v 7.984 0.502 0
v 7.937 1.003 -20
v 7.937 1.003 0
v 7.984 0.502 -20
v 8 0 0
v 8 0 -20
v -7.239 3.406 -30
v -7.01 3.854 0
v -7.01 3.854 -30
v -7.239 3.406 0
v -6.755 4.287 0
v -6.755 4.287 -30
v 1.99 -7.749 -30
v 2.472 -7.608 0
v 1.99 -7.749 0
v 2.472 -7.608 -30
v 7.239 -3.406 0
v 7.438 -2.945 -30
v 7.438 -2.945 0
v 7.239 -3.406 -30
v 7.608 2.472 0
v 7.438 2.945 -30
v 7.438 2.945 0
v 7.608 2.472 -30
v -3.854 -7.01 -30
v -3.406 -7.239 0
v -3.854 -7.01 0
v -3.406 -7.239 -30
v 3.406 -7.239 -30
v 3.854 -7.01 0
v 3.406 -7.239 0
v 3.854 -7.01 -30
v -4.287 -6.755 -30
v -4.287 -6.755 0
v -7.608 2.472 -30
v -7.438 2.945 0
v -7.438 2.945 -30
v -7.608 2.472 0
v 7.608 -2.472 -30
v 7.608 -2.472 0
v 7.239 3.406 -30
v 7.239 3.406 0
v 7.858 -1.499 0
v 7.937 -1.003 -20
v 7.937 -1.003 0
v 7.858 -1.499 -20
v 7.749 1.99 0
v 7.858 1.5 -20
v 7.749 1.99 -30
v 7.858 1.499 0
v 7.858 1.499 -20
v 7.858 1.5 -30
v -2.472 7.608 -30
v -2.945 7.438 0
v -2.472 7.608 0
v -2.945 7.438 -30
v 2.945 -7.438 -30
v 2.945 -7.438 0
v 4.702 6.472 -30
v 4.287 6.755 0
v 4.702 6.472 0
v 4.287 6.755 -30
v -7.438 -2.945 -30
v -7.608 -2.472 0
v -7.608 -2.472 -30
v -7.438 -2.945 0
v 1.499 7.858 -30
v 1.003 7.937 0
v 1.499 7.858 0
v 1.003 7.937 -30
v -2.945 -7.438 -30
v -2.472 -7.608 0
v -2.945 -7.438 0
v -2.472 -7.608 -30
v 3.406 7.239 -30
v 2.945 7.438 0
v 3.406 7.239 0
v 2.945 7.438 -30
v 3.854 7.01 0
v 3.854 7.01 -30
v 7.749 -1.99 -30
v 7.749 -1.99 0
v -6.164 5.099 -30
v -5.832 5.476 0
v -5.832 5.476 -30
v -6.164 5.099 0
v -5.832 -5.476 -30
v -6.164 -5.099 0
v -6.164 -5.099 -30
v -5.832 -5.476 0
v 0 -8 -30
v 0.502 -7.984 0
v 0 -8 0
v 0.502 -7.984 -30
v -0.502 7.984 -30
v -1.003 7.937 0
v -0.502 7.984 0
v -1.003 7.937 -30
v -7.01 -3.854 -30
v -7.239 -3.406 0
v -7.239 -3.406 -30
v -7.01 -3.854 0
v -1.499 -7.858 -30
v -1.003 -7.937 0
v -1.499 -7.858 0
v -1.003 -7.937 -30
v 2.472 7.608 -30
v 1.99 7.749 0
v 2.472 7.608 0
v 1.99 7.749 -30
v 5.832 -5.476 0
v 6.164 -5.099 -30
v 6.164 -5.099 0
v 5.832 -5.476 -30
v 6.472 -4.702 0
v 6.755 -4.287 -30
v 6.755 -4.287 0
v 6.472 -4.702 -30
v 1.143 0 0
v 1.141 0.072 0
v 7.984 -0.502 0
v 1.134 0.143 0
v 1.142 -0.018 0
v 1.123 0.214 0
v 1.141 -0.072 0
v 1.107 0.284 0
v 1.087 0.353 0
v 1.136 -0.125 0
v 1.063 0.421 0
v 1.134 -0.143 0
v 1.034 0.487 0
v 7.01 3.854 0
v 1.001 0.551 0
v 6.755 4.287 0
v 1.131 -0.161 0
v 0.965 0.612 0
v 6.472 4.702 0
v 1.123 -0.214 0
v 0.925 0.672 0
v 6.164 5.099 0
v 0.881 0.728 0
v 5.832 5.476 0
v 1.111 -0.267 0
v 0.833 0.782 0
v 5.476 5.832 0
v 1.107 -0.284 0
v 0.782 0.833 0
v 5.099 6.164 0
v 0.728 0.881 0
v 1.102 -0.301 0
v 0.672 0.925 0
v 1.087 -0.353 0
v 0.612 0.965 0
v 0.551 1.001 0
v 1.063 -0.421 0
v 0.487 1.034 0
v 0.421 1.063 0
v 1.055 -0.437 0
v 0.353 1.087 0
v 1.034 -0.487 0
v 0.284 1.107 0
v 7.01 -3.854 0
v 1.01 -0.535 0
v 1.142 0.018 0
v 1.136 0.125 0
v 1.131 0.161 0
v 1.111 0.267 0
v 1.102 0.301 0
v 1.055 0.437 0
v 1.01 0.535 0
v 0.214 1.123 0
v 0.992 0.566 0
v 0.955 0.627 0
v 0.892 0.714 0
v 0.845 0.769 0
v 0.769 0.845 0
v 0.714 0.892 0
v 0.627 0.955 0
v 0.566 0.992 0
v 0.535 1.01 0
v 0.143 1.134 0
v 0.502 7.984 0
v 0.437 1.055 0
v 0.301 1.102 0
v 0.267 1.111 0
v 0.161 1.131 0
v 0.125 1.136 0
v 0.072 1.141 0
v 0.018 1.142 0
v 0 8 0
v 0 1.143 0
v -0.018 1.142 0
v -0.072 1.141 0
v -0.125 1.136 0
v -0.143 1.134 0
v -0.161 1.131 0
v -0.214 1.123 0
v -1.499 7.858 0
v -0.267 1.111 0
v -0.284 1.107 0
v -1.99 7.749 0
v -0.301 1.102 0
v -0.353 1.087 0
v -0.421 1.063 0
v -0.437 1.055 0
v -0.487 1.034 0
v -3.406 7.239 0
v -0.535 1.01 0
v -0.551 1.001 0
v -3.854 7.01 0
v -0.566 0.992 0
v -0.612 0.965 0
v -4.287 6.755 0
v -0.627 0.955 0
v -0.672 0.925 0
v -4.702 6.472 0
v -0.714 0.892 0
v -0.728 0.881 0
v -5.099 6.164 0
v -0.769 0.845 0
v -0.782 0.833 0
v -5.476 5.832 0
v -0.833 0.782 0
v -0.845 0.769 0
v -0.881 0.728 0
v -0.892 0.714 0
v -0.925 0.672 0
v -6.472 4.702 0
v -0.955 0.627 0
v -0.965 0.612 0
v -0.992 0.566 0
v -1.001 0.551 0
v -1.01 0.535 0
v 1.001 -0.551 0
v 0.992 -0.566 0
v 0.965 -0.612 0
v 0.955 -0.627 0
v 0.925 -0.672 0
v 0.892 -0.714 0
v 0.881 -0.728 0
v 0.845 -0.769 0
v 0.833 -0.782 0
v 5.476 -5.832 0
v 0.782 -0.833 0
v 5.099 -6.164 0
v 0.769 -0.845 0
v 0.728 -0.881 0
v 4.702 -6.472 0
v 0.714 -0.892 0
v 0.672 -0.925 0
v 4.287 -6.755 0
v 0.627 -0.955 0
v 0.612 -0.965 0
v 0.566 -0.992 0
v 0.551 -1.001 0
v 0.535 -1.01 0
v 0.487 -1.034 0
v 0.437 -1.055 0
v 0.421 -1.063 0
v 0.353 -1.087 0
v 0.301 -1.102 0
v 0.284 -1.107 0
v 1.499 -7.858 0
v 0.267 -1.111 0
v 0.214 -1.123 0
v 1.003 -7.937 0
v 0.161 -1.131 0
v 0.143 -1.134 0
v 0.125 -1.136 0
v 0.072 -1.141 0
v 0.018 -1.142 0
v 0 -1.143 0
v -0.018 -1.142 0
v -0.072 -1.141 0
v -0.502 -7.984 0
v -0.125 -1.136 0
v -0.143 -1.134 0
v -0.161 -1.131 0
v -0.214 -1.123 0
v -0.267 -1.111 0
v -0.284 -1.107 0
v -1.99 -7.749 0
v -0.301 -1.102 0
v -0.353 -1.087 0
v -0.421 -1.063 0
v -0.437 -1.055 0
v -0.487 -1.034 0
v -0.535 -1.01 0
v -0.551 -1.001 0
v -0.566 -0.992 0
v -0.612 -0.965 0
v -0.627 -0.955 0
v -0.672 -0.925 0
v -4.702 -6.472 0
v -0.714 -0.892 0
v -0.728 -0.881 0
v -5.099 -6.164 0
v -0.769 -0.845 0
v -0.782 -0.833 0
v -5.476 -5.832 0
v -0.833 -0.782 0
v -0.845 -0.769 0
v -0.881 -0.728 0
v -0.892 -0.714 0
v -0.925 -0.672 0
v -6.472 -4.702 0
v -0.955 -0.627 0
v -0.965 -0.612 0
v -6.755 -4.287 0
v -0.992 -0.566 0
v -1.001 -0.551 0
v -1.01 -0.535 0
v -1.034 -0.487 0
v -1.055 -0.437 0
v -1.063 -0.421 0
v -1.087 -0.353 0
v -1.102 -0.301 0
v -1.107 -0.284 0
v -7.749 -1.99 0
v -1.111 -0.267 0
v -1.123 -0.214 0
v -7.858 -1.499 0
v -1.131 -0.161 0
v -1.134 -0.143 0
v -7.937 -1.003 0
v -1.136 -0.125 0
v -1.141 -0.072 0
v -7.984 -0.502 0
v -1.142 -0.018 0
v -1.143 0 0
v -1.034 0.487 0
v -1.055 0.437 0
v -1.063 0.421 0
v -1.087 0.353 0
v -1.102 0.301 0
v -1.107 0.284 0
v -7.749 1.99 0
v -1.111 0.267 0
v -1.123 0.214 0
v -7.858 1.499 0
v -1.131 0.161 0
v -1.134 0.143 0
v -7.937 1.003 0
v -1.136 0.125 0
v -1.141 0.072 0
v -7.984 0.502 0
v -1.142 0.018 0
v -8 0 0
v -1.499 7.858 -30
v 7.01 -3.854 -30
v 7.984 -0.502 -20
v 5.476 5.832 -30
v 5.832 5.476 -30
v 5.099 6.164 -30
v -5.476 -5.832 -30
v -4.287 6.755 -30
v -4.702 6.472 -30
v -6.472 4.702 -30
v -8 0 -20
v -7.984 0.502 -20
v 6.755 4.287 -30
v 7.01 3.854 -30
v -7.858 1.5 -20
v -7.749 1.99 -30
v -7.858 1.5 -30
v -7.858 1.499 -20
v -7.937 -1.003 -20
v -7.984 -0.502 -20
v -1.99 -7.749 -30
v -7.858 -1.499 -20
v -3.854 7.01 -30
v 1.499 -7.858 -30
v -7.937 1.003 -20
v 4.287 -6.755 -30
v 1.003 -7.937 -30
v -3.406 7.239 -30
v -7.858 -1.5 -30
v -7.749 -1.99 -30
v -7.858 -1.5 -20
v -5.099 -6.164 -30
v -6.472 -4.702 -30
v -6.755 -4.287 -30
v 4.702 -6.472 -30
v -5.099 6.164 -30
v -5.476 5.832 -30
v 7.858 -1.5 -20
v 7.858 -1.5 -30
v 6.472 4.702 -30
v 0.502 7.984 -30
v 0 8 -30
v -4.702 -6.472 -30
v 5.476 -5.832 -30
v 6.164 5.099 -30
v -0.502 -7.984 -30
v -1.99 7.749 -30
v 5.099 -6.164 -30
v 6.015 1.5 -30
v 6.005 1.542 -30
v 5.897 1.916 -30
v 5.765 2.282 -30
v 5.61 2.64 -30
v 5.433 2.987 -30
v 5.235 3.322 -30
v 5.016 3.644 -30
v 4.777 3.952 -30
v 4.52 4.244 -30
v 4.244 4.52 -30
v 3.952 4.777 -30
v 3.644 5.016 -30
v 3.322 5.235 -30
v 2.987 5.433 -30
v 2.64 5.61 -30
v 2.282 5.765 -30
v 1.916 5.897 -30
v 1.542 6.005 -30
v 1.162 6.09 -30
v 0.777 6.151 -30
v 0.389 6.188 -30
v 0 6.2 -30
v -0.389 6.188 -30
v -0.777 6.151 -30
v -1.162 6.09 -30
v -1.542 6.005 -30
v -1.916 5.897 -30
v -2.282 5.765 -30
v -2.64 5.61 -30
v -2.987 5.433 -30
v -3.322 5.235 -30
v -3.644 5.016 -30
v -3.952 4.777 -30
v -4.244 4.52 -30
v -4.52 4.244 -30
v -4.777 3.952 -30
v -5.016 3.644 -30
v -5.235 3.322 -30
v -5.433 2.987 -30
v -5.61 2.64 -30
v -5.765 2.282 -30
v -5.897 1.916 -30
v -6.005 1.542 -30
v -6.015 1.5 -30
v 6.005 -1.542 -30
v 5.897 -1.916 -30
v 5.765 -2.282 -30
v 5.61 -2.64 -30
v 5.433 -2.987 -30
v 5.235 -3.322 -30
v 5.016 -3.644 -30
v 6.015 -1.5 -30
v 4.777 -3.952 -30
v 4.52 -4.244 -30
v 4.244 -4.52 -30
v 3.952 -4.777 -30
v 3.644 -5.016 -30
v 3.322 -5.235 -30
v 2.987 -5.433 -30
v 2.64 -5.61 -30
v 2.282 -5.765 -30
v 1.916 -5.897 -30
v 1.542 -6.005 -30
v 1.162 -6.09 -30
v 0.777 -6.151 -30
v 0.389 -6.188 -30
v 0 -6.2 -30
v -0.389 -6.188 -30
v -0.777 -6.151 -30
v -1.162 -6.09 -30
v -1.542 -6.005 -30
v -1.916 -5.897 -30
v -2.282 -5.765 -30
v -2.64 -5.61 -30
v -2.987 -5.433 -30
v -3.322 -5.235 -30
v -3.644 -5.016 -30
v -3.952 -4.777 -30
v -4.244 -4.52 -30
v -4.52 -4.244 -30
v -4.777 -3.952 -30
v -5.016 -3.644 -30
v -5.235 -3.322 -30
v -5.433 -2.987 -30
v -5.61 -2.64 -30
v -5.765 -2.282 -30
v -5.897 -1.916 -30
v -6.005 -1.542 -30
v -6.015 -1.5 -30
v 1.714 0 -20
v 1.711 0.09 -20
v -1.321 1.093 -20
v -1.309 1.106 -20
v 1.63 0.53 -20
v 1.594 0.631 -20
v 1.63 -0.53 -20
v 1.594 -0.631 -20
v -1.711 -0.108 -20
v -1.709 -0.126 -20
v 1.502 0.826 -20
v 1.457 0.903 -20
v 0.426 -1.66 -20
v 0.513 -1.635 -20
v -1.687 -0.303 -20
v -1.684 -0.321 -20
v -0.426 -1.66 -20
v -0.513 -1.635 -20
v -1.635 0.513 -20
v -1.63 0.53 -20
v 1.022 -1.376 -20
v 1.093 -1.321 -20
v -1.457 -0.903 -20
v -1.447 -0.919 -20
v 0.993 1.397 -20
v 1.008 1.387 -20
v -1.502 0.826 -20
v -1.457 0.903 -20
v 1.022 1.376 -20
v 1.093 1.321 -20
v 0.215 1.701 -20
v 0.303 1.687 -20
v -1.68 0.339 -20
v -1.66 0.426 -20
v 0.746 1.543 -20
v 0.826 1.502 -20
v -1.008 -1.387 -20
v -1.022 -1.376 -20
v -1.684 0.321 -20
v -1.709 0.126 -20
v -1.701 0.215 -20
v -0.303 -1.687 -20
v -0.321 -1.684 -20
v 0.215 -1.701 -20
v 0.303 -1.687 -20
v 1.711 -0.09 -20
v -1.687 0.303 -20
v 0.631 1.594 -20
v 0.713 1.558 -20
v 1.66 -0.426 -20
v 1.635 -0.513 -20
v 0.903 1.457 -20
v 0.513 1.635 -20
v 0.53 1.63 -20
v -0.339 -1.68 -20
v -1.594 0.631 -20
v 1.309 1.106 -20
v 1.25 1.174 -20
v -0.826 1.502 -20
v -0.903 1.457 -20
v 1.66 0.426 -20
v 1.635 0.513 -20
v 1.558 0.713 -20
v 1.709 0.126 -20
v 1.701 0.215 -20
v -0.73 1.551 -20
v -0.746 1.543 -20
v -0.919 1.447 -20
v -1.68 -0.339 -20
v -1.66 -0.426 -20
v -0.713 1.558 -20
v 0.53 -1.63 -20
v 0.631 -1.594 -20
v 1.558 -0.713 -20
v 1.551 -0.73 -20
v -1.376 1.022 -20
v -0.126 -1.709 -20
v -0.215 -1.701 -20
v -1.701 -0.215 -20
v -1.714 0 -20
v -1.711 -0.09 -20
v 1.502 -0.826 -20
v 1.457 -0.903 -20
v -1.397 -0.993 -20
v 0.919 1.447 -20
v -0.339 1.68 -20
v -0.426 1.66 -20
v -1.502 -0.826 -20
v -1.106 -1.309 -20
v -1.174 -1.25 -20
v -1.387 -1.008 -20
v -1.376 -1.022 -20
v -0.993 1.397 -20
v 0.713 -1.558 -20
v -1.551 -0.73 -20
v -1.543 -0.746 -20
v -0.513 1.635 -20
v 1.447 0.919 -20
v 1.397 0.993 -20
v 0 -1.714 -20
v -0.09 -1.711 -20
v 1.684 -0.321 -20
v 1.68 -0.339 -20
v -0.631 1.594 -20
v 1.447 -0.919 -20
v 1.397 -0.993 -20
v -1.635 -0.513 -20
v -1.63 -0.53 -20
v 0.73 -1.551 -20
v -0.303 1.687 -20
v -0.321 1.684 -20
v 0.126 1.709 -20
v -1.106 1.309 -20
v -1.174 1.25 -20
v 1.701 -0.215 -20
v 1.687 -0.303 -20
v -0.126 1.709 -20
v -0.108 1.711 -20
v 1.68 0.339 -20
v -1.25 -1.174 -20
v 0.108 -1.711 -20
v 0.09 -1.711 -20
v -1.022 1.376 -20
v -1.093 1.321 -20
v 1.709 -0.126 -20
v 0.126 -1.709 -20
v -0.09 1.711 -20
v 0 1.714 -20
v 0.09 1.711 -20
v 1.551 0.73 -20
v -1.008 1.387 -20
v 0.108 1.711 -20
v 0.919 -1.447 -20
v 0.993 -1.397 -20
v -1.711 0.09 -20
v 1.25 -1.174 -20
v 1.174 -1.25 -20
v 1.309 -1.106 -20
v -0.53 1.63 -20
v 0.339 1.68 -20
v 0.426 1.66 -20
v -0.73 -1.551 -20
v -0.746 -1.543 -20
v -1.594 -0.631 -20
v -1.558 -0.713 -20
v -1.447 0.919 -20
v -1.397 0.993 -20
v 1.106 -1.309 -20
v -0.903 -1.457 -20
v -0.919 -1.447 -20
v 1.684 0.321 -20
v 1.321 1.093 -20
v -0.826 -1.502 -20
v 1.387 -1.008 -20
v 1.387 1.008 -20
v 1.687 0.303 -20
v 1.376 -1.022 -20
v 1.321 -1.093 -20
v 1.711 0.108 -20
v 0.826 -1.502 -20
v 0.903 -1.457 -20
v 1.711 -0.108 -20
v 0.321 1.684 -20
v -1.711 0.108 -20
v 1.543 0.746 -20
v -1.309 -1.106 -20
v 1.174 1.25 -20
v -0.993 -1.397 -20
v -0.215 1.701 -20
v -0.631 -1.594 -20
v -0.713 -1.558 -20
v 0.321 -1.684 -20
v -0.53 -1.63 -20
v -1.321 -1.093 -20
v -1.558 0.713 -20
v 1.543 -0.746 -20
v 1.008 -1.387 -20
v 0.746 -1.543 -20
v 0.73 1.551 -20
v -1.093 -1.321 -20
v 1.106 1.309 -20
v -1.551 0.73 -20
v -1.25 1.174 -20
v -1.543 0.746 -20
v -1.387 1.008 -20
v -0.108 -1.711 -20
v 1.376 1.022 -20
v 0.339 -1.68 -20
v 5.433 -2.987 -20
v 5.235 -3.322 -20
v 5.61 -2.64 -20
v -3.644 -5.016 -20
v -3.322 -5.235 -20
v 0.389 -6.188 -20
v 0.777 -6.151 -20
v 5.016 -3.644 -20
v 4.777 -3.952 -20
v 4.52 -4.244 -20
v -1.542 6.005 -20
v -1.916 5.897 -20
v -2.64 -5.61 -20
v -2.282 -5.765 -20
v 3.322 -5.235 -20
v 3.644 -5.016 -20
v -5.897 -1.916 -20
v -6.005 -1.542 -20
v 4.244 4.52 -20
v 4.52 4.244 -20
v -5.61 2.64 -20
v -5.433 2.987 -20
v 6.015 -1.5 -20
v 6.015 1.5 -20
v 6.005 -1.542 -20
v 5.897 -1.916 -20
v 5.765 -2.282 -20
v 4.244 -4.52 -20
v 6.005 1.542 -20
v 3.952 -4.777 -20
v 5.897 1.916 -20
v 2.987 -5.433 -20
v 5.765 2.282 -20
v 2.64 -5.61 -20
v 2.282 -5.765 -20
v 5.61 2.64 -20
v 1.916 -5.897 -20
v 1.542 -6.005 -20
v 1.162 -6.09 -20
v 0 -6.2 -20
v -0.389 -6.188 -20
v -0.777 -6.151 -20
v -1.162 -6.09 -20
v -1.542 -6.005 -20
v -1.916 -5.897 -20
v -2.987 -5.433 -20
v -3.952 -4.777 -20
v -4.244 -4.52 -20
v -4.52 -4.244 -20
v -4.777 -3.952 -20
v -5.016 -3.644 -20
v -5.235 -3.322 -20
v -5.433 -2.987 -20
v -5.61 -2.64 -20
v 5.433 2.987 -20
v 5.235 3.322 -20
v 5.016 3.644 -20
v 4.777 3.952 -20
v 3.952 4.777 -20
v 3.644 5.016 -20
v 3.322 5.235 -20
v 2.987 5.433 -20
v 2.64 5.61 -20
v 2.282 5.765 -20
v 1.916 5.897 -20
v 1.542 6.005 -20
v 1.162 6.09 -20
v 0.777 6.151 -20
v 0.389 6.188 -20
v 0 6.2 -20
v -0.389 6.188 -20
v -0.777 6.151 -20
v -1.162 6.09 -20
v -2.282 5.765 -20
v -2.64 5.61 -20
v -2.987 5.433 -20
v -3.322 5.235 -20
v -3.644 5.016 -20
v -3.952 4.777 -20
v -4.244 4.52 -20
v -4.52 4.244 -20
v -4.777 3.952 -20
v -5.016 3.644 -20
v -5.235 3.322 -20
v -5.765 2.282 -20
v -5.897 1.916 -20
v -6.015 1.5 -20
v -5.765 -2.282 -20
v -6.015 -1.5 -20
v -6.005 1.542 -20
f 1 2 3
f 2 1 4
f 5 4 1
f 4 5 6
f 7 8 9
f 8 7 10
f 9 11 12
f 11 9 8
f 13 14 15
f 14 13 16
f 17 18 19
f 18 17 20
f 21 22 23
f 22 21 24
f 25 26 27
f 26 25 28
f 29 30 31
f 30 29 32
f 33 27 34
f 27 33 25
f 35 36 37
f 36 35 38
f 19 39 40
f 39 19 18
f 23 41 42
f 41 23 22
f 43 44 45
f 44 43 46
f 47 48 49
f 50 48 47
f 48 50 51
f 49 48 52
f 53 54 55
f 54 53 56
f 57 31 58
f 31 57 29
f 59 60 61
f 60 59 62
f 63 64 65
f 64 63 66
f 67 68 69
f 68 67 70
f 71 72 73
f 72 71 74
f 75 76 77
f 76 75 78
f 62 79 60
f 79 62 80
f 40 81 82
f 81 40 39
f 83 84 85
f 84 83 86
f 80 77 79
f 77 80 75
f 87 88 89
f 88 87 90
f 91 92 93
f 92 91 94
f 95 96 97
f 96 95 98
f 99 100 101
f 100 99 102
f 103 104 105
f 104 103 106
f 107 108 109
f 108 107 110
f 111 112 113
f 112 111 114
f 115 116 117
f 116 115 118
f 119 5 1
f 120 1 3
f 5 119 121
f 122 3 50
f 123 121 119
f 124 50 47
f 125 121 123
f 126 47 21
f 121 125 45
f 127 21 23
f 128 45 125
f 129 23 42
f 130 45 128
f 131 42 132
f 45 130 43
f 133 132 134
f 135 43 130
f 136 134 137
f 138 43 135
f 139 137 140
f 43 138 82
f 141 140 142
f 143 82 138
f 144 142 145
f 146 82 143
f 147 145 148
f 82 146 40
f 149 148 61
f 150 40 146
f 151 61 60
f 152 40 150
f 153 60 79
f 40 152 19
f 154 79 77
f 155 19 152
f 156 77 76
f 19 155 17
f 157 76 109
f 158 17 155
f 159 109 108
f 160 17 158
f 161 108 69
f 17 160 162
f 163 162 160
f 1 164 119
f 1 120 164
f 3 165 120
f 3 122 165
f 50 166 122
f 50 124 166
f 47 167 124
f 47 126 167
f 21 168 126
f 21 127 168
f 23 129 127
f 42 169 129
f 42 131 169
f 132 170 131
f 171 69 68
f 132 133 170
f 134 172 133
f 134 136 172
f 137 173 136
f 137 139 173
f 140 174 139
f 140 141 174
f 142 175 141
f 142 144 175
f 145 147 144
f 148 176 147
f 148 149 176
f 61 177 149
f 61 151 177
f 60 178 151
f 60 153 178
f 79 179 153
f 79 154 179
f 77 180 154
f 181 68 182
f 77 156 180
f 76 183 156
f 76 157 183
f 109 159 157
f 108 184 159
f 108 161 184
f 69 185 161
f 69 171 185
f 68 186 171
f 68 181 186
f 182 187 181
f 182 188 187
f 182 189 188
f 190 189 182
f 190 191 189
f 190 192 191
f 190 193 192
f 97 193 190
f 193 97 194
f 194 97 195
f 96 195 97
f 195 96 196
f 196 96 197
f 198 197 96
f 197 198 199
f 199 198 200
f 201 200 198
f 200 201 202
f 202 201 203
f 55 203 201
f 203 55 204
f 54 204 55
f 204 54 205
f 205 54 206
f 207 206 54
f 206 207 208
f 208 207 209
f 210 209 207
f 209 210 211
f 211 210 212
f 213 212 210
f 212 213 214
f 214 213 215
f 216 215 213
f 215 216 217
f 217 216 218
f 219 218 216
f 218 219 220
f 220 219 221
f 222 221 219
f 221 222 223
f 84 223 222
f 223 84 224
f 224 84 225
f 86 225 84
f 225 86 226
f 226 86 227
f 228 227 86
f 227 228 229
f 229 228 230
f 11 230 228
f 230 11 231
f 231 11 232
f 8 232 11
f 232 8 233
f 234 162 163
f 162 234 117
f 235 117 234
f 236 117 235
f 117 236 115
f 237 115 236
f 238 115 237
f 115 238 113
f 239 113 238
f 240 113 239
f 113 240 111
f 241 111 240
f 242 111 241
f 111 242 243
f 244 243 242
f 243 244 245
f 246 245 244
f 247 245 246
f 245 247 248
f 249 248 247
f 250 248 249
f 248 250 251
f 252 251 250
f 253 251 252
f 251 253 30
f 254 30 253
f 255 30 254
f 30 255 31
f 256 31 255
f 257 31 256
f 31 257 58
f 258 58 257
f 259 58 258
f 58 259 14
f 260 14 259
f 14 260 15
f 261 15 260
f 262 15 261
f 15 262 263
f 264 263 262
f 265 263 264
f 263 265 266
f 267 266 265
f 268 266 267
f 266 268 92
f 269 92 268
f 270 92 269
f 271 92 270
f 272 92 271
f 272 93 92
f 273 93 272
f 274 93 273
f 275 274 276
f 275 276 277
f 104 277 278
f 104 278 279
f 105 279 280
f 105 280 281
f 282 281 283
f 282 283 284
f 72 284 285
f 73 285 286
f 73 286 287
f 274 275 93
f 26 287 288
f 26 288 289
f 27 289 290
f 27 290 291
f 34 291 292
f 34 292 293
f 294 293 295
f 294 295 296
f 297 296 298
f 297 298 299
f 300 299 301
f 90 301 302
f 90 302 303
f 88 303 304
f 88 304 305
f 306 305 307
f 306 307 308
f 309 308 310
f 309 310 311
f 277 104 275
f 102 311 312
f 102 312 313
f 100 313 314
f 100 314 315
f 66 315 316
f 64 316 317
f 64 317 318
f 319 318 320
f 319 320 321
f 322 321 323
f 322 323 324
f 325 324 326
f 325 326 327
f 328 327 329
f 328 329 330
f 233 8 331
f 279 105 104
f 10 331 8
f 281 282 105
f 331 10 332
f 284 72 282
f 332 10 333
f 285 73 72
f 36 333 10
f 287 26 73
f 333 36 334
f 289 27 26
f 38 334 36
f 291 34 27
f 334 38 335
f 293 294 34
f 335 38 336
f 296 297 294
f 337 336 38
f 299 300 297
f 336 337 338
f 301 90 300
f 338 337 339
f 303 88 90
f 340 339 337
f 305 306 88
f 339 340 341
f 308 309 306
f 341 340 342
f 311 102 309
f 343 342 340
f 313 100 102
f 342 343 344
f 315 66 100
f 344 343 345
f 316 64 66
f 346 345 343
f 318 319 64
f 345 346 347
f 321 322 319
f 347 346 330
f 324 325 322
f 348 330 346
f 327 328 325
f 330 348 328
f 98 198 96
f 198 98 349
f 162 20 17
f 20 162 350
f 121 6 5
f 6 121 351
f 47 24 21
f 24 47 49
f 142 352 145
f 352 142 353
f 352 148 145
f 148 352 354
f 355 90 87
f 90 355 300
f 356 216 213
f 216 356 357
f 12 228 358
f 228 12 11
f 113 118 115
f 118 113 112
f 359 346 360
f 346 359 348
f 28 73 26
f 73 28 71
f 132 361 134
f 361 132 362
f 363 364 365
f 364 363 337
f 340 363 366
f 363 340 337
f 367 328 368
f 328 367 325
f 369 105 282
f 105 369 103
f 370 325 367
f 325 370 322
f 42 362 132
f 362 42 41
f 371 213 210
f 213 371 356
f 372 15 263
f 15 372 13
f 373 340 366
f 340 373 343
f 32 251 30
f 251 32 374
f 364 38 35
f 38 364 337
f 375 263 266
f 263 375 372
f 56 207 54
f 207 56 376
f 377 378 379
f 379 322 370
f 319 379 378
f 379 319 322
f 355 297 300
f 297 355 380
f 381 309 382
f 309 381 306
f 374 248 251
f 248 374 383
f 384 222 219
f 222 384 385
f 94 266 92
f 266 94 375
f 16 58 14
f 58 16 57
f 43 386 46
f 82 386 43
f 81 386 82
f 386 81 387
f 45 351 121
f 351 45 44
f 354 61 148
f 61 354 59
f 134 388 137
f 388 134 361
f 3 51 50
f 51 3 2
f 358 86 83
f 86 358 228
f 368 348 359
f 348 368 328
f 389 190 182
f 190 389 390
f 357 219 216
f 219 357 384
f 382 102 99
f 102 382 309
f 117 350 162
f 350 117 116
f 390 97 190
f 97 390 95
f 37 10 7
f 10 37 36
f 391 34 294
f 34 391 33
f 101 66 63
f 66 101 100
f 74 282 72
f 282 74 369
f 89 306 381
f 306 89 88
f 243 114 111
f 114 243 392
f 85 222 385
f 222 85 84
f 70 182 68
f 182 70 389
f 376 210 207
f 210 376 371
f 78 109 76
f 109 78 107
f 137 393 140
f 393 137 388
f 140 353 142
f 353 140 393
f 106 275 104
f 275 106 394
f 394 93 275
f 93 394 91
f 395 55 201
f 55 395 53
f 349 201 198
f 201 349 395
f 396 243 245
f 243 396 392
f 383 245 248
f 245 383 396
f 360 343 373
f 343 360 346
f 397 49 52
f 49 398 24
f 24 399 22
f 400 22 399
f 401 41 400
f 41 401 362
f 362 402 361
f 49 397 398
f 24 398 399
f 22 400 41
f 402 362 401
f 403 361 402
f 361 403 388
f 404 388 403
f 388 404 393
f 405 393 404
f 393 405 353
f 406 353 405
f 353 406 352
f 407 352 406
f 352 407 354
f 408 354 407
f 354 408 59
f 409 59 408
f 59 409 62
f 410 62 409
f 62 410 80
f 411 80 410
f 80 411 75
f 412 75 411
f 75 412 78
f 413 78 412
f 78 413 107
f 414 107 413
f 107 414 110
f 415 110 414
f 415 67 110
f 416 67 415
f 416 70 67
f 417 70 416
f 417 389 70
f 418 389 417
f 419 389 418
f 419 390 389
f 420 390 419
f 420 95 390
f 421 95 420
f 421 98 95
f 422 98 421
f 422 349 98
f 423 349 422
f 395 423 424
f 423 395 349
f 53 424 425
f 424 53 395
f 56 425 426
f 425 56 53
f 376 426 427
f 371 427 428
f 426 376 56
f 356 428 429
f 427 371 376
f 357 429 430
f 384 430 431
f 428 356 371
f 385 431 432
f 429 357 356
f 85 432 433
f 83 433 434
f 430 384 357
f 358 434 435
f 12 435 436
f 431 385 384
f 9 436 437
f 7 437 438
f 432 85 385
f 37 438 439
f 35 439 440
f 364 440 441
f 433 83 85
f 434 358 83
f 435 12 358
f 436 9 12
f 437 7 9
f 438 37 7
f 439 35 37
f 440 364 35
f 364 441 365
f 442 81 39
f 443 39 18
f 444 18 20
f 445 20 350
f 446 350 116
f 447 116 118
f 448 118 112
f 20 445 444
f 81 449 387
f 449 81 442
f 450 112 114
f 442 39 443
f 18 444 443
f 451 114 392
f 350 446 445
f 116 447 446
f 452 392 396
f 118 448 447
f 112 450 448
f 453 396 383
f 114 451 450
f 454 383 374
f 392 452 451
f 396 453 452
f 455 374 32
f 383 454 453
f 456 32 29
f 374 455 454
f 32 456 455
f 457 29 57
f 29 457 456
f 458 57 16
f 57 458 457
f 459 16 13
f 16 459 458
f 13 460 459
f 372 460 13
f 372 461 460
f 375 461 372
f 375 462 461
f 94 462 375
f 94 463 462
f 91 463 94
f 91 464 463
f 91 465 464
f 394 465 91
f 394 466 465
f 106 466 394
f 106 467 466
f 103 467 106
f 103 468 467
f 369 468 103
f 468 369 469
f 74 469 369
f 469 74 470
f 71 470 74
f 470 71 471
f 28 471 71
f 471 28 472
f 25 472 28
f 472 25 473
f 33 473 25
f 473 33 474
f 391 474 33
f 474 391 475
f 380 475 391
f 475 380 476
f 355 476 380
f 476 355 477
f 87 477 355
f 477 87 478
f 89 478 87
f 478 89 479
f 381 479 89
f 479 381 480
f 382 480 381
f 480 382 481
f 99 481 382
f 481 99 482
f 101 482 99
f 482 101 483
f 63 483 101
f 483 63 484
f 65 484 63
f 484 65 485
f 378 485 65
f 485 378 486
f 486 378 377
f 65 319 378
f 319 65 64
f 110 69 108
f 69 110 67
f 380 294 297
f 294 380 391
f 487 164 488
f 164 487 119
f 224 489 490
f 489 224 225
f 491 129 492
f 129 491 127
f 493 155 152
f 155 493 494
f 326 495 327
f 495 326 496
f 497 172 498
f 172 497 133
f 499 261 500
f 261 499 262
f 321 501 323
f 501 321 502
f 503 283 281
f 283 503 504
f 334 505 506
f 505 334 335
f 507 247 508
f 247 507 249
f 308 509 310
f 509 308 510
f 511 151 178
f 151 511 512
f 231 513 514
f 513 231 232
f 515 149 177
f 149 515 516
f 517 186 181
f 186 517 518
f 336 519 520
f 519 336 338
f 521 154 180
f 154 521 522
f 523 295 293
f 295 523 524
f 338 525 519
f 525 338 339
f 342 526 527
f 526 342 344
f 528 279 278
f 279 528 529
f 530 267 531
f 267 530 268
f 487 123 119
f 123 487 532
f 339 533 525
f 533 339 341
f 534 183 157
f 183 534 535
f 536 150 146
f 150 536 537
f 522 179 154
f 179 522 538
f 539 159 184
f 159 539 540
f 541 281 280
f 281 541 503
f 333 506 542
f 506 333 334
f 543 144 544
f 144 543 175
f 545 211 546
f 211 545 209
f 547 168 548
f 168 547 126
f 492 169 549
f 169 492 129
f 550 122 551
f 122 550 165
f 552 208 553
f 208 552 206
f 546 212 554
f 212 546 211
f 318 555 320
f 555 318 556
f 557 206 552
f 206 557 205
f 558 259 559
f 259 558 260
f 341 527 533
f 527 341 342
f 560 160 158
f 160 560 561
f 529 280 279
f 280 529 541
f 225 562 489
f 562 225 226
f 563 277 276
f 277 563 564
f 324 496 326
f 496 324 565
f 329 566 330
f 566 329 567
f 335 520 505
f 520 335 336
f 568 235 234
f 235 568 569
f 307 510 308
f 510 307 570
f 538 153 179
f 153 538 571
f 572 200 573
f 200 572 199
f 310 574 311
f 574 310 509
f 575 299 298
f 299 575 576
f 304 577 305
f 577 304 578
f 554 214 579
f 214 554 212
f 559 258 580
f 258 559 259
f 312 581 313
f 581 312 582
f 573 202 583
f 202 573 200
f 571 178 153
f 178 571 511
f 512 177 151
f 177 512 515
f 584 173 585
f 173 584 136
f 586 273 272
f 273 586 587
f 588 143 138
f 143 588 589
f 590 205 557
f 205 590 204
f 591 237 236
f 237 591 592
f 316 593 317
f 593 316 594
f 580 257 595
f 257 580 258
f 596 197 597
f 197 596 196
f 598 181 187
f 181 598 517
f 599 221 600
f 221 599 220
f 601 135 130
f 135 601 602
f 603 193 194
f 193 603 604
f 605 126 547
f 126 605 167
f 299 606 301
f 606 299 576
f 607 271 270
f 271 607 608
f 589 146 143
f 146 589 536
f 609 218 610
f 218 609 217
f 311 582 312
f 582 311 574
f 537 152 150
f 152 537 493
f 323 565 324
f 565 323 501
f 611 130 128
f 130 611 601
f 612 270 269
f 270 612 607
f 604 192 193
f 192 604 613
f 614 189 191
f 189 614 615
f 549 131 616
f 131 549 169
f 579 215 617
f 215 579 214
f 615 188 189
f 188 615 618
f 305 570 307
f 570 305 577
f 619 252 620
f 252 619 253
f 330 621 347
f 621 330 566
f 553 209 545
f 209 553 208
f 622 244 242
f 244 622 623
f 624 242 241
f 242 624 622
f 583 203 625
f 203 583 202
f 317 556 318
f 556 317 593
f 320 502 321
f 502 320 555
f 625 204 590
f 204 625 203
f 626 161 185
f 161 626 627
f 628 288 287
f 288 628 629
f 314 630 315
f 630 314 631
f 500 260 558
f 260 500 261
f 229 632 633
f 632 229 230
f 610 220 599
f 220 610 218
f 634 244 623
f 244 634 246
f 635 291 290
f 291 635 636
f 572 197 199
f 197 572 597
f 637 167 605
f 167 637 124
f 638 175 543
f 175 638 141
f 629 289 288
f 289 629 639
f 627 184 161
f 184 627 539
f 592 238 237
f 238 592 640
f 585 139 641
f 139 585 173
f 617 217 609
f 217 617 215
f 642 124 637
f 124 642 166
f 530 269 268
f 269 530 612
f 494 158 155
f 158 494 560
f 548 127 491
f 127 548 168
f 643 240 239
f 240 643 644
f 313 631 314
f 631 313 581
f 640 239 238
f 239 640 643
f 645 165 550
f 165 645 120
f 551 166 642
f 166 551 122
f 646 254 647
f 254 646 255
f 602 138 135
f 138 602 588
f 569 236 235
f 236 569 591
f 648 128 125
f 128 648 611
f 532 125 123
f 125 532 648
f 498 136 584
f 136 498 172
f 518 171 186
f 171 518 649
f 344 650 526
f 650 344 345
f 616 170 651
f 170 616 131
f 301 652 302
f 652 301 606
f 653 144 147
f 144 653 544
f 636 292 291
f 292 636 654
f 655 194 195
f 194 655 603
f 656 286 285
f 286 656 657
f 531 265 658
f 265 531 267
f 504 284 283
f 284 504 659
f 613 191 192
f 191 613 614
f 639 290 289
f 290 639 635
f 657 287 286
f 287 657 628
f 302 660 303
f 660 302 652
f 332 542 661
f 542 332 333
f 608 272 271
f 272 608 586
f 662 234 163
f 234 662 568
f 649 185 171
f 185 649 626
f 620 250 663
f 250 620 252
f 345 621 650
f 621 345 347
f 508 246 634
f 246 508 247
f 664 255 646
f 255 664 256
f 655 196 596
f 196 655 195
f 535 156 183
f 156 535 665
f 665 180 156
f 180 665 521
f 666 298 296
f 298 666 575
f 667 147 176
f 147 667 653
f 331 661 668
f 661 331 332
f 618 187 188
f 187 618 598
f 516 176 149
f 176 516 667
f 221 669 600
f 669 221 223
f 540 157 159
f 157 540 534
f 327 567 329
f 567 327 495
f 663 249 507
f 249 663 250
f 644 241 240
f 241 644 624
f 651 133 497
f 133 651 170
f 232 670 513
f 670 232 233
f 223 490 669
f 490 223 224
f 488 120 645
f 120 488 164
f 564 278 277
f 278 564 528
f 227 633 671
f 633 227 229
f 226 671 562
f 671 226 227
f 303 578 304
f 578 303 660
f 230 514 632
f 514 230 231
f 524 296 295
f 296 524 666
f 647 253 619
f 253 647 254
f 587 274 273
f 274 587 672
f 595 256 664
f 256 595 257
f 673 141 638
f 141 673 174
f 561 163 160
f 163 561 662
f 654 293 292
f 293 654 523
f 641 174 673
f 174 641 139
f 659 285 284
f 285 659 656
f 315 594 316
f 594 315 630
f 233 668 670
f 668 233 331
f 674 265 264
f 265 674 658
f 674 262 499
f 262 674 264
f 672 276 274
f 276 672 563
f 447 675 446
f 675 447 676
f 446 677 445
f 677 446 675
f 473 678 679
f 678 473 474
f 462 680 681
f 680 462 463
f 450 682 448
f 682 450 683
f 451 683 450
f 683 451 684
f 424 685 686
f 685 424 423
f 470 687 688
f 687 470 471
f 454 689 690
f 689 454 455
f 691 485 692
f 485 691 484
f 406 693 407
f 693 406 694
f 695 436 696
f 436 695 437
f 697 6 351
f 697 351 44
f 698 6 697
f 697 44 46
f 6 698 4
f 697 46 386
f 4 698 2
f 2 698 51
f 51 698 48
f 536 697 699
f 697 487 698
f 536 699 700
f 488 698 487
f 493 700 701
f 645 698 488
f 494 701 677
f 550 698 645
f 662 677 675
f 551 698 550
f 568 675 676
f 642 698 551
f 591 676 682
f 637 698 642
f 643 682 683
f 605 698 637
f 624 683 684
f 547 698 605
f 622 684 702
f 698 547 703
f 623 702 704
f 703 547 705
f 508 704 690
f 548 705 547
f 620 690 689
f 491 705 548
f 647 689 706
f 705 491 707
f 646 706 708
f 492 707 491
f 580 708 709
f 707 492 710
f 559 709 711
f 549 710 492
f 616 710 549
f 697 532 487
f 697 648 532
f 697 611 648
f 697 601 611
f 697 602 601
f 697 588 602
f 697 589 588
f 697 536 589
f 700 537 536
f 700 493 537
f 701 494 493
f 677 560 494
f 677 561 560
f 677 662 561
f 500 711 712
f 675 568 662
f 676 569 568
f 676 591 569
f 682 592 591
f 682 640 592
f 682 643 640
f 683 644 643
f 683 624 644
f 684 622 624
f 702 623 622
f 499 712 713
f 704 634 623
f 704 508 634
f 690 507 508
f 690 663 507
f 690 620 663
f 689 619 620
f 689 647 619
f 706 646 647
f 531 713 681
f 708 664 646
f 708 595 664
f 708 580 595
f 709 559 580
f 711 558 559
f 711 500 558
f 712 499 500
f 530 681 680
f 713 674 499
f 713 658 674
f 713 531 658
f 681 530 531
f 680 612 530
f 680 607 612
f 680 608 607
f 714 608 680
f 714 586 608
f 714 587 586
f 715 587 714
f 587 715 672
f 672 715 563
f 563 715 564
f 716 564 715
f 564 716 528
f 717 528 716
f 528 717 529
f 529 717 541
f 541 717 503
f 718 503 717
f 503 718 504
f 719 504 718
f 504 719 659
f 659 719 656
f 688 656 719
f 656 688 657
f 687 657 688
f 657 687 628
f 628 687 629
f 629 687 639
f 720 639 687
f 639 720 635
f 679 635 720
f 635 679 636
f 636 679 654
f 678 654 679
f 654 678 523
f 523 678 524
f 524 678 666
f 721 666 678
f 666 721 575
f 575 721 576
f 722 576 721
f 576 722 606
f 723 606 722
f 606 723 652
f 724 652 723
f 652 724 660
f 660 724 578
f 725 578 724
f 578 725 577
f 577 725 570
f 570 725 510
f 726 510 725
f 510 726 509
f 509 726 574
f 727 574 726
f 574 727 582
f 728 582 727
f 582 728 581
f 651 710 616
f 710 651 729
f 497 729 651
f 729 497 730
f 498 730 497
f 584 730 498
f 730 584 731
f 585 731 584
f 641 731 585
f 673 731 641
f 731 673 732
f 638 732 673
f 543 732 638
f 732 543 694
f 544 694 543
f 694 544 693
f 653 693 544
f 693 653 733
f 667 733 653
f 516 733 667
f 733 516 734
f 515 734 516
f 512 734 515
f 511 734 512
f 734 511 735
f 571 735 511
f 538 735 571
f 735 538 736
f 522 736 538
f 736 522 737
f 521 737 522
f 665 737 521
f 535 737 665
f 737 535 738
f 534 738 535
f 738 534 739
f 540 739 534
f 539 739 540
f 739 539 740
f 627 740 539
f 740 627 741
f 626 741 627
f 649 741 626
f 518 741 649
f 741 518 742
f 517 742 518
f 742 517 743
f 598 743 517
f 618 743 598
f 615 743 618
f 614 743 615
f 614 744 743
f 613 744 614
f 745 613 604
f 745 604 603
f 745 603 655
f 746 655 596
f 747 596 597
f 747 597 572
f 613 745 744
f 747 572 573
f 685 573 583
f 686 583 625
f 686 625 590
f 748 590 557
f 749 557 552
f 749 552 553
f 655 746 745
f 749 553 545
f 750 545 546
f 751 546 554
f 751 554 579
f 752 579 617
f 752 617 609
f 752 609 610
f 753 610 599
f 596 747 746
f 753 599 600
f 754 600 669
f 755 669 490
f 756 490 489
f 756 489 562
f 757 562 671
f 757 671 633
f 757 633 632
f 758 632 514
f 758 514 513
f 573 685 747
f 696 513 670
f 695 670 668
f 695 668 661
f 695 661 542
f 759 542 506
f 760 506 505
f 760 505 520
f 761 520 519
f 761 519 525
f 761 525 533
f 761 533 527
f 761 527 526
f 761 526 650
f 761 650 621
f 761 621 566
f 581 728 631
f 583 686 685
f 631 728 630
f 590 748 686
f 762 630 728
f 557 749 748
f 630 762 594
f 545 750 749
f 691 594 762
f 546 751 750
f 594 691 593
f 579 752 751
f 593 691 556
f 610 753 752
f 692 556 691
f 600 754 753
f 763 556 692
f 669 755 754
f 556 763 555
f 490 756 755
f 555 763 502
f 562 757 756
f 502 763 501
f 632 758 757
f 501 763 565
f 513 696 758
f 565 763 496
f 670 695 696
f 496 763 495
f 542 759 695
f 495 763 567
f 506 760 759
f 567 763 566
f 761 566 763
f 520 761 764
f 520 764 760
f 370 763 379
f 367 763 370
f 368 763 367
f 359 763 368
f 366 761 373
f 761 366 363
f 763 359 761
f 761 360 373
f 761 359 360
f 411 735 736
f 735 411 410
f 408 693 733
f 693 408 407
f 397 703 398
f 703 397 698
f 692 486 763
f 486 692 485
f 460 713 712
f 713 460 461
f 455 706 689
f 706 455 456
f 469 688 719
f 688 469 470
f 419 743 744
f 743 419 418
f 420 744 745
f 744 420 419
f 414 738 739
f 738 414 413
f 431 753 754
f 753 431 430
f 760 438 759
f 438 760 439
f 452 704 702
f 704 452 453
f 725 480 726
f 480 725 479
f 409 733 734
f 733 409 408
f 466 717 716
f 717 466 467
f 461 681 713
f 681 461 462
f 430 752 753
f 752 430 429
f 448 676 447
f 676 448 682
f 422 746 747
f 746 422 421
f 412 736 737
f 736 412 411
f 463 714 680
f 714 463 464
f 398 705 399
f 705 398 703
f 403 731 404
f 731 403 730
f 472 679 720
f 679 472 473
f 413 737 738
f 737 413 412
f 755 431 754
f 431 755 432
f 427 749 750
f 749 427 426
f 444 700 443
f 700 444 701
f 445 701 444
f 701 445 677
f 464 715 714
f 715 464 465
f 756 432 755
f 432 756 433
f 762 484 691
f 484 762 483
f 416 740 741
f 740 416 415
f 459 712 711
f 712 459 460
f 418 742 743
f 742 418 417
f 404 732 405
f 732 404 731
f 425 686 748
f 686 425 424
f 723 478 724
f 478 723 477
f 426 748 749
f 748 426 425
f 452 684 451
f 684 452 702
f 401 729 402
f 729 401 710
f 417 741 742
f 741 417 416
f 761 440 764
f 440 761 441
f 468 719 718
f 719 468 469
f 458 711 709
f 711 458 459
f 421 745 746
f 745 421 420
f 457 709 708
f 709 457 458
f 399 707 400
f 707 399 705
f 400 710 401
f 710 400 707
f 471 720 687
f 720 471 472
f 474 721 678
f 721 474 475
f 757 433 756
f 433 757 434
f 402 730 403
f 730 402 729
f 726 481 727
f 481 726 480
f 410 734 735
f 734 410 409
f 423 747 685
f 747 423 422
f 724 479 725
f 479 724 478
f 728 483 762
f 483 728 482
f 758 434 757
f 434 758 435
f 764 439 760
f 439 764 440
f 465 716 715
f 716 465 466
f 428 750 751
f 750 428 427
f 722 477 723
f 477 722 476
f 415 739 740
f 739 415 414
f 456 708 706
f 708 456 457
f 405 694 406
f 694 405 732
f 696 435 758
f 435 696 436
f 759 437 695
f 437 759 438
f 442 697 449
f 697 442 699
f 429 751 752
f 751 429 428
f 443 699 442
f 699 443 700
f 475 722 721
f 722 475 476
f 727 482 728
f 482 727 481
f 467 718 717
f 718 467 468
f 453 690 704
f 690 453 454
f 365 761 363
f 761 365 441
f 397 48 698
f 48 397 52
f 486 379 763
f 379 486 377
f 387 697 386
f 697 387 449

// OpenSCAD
$fn = 100;



translate([0,0,-30])
difference() {
    cylinder(r = 8, h = 30);

    cylinder(r1 = 2, r2 = 1, h = 35);
    translate([0,0,-10])
        cylinder(r = 6.2, h = 20);
    cube([30, 3, 20], true);
}
